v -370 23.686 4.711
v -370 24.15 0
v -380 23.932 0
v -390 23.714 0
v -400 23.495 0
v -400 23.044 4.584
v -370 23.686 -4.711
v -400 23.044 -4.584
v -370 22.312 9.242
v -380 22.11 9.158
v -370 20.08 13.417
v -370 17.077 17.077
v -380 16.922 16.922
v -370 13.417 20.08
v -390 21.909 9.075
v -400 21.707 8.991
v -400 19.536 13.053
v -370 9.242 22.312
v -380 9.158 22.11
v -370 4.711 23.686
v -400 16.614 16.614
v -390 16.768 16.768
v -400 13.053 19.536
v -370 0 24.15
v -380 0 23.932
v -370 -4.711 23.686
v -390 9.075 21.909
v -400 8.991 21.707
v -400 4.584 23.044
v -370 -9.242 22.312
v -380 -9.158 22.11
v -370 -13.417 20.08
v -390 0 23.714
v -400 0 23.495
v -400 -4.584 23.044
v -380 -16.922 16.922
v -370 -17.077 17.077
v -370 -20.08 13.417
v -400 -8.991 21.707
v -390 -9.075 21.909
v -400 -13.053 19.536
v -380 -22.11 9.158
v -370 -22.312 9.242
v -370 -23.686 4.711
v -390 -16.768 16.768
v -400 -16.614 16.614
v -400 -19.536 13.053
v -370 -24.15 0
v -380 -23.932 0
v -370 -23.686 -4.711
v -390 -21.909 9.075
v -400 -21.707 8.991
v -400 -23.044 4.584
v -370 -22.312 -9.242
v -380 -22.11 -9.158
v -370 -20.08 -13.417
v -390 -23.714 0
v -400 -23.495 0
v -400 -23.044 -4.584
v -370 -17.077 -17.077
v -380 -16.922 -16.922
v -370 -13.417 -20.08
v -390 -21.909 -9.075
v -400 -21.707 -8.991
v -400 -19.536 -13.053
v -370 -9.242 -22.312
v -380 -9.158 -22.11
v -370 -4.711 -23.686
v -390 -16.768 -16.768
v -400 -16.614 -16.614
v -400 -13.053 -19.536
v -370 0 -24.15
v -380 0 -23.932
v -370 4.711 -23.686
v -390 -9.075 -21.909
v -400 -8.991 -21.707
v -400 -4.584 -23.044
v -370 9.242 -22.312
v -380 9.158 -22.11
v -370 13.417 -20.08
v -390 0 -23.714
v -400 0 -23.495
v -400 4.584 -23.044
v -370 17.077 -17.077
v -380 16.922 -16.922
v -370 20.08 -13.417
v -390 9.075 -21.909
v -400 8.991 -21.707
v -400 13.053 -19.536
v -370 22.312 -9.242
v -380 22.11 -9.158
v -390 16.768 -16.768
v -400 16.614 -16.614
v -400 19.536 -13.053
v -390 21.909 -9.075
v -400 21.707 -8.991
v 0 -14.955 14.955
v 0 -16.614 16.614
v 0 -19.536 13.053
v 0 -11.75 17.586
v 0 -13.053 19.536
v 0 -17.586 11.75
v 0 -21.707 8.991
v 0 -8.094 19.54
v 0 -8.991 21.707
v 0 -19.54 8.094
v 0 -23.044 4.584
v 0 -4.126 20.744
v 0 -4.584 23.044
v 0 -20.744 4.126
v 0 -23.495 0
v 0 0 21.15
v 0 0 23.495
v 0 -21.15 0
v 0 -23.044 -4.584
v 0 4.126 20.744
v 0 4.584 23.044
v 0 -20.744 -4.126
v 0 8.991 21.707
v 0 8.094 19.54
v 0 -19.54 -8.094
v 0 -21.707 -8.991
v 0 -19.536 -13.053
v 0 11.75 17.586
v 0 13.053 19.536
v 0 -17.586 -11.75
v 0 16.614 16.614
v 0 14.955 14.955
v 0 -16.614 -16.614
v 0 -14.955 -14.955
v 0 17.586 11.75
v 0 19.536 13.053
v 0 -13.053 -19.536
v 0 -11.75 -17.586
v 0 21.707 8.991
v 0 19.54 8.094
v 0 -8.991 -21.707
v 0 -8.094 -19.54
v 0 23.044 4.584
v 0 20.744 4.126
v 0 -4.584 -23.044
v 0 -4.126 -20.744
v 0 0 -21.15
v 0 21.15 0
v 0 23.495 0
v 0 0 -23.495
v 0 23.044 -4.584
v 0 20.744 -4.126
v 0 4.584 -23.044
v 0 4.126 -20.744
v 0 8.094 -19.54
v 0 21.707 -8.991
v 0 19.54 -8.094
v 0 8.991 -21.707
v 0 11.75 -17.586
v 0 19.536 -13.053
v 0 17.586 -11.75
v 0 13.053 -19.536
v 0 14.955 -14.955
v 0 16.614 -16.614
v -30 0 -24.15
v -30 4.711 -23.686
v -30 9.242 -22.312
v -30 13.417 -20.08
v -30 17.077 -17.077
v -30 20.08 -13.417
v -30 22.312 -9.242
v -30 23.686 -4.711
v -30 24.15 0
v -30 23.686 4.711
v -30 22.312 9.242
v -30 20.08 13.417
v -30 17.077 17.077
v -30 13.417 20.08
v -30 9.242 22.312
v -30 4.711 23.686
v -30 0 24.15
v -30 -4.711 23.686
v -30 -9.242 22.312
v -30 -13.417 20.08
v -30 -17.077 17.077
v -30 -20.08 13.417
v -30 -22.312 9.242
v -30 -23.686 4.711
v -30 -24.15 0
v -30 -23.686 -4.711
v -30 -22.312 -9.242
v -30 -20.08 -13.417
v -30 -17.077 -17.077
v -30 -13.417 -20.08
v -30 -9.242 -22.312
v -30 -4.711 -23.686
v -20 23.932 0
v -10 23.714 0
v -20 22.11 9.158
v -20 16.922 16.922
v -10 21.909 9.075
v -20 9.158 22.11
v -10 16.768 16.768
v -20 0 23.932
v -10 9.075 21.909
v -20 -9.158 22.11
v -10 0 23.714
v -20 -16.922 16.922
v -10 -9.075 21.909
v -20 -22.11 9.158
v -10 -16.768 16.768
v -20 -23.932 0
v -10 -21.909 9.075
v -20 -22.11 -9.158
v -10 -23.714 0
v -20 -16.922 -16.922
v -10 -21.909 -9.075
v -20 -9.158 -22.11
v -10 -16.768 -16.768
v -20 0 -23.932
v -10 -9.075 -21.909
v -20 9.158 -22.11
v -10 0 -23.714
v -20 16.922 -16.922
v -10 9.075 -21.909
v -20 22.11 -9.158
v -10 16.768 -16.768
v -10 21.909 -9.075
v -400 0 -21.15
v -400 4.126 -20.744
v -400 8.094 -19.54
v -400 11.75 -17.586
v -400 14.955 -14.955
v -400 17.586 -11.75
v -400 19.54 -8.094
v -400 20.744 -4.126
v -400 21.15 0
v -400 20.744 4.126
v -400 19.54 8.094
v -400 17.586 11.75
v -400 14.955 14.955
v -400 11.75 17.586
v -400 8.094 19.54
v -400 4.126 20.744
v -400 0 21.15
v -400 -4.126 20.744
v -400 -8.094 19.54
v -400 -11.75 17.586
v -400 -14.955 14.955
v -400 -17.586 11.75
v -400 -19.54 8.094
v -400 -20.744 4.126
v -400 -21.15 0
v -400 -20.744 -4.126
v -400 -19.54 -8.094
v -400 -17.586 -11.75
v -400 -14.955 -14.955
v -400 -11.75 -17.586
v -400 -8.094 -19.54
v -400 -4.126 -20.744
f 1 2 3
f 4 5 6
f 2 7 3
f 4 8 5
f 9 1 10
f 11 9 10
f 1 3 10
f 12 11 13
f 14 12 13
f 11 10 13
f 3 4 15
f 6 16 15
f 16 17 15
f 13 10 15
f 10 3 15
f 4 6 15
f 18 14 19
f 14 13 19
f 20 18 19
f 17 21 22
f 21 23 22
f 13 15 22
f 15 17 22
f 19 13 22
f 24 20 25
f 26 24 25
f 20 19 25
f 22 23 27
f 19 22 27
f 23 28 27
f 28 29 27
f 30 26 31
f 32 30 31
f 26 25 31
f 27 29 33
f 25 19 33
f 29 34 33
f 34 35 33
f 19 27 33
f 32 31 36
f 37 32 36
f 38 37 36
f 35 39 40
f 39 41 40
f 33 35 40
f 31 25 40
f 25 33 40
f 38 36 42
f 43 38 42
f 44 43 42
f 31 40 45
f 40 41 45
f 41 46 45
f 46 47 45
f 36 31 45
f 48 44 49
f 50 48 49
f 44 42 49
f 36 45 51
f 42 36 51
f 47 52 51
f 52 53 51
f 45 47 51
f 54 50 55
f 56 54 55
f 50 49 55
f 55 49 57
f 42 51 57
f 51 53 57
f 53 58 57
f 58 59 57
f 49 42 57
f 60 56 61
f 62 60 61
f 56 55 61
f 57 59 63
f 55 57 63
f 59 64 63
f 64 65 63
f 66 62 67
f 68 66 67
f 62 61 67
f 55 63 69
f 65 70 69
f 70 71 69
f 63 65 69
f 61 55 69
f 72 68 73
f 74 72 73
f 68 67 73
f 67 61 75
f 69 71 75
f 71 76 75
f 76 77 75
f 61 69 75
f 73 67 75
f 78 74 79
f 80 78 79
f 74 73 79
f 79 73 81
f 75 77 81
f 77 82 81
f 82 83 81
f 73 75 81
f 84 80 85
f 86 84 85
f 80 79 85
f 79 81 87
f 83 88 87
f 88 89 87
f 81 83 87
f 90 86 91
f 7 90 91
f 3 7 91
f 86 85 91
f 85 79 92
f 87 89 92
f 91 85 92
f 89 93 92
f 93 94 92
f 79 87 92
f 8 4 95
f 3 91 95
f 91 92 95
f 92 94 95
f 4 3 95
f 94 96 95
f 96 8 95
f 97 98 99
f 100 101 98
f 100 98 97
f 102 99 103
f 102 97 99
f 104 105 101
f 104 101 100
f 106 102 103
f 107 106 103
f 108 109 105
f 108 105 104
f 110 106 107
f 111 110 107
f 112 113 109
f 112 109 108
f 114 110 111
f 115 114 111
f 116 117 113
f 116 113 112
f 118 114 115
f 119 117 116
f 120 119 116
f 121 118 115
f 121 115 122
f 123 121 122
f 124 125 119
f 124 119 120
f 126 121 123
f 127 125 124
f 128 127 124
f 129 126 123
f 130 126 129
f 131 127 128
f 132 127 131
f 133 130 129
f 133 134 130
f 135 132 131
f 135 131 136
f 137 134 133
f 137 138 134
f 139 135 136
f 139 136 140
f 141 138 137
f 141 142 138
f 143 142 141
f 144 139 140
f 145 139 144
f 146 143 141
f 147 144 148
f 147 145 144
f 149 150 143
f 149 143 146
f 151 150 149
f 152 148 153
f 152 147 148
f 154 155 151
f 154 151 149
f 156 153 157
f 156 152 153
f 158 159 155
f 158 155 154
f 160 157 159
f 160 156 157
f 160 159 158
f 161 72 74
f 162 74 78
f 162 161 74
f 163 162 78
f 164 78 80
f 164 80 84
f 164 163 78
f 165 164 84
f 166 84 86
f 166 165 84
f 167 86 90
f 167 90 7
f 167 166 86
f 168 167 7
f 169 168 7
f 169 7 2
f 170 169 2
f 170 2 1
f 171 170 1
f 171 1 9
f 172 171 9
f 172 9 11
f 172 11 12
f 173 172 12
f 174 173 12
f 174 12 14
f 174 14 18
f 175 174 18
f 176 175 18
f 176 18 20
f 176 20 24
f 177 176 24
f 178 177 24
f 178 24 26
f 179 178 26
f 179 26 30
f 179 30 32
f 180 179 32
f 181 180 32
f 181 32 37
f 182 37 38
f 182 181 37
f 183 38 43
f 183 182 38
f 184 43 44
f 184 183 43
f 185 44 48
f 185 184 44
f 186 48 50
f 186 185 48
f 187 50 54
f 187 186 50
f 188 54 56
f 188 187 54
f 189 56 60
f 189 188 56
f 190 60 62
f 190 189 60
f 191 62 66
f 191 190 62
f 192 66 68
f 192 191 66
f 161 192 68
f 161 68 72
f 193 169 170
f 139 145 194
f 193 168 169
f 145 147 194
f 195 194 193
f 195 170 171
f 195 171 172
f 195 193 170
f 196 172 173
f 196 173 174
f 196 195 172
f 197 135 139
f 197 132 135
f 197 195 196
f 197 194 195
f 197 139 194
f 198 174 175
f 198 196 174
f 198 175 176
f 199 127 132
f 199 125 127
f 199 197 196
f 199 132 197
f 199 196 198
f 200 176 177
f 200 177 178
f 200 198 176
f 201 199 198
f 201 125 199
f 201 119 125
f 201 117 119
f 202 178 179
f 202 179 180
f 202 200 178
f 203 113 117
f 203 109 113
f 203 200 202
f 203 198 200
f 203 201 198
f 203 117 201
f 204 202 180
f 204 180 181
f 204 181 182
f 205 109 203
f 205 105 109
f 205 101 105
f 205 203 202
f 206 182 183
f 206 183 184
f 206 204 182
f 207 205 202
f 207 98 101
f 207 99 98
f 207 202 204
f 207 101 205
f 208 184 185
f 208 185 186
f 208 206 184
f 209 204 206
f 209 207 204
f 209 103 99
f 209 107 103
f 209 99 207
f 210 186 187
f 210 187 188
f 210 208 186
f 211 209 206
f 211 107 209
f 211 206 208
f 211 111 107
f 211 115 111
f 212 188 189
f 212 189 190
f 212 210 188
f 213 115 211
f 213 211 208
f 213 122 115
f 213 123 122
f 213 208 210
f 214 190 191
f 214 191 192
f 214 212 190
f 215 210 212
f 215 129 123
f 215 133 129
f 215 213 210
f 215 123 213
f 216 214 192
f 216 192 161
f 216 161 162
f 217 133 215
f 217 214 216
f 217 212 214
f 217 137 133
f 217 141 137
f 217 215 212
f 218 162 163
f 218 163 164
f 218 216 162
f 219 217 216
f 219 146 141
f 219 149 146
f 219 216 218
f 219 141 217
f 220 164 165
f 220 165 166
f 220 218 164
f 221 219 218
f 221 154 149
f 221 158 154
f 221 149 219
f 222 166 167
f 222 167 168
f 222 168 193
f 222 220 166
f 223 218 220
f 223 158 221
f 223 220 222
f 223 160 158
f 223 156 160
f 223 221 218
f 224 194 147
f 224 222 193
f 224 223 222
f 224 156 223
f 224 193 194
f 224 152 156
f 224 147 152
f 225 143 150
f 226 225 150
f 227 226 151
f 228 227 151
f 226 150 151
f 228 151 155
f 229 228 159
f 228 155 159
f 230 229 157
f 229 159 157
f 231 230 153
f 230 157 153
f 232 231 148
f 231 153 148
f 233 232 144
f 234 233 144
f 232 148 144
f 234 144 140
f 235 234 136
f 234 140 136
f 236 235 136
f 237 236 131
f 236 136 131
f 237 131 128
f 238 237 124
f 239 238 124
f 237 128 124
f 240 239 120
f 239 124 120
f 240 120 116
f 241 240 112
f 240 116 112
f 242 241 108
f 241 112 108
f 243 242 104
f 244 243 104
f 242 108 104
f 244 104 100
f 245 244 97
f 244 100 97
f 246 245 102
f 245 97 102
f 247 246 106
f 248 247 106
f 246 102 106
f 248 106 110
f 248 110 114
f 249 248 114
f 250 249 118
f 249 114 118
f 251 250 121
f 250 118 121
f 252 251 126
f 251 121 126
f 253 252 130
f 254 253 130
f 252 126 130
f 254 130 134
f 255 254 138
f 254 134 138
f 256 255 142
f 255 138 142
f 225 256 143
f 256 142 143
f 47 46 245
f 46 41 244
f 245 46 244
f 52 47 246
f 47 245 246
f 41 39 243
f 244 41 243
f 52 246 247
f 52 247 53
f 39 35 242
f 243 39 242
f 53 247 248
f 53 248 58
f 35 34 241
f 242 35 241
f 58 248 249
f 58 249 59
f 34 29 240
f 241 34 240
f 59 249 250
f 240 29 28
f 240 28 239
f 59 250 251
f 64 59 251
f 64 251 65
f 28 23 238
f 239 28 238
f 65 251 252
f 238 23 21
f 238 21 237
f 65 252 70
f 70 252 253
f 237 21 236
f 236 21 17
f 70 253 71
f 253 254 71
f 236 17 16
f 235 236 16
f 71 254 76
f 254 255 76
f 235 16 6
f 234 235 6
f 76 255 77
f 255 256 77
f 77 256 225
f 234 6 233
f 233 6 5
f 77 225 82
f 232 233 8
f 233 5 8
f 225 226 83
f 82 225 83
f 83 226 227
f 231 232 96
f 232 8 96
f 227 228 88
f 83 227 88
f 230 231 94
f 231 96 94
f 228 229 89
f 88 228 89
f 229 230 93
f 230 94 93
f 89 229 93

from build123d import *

# Parameters (mm, degrees)
SKETCH1_R           = 24.15
SKETCH1_R_2         = 21.15
BOSS_EXTRUDE1_DEPTH = 400


with BuildPart() as part:
    # Sketch1 → Boss-Extrude1 (new body)
    with BuildSketch(Plane(origin=(0, 0, 0), x_dir=(0, 0, -1), z_dir=(1, 0, 0))):
        Circle(SKETCH1_R)
        Circle(SKETCH1_R_2, mode=Mode.SUBTRACT)
    extrude(amount=-BOSS_EXTRUDE1_DEPTH)

    # Sketch2 → Cut-Revolve1 (revolve, cut)
    with BuildSketch(Plane.XY):
        Polygon((0, 24.15), (-30, 24.15), (0, 23.495397671), align=None)
    revolve(axis=Axis((0, 0, 0), (1, 0, 0)), mode=Mode.SUBTRACT)

    # Sketch3 → Cut-Revolve2 (revolve, cut)
    with BuildSketch(Plane.XY):
        Polygon((-400, 24.15), (-370, 24.15), (-400, 23.495397671), align=None)
    revolve(axis=Axis((-400, 0, 0), (1, 0, 0)), mode=Mode.SUBTRACT)


solid = part.part
